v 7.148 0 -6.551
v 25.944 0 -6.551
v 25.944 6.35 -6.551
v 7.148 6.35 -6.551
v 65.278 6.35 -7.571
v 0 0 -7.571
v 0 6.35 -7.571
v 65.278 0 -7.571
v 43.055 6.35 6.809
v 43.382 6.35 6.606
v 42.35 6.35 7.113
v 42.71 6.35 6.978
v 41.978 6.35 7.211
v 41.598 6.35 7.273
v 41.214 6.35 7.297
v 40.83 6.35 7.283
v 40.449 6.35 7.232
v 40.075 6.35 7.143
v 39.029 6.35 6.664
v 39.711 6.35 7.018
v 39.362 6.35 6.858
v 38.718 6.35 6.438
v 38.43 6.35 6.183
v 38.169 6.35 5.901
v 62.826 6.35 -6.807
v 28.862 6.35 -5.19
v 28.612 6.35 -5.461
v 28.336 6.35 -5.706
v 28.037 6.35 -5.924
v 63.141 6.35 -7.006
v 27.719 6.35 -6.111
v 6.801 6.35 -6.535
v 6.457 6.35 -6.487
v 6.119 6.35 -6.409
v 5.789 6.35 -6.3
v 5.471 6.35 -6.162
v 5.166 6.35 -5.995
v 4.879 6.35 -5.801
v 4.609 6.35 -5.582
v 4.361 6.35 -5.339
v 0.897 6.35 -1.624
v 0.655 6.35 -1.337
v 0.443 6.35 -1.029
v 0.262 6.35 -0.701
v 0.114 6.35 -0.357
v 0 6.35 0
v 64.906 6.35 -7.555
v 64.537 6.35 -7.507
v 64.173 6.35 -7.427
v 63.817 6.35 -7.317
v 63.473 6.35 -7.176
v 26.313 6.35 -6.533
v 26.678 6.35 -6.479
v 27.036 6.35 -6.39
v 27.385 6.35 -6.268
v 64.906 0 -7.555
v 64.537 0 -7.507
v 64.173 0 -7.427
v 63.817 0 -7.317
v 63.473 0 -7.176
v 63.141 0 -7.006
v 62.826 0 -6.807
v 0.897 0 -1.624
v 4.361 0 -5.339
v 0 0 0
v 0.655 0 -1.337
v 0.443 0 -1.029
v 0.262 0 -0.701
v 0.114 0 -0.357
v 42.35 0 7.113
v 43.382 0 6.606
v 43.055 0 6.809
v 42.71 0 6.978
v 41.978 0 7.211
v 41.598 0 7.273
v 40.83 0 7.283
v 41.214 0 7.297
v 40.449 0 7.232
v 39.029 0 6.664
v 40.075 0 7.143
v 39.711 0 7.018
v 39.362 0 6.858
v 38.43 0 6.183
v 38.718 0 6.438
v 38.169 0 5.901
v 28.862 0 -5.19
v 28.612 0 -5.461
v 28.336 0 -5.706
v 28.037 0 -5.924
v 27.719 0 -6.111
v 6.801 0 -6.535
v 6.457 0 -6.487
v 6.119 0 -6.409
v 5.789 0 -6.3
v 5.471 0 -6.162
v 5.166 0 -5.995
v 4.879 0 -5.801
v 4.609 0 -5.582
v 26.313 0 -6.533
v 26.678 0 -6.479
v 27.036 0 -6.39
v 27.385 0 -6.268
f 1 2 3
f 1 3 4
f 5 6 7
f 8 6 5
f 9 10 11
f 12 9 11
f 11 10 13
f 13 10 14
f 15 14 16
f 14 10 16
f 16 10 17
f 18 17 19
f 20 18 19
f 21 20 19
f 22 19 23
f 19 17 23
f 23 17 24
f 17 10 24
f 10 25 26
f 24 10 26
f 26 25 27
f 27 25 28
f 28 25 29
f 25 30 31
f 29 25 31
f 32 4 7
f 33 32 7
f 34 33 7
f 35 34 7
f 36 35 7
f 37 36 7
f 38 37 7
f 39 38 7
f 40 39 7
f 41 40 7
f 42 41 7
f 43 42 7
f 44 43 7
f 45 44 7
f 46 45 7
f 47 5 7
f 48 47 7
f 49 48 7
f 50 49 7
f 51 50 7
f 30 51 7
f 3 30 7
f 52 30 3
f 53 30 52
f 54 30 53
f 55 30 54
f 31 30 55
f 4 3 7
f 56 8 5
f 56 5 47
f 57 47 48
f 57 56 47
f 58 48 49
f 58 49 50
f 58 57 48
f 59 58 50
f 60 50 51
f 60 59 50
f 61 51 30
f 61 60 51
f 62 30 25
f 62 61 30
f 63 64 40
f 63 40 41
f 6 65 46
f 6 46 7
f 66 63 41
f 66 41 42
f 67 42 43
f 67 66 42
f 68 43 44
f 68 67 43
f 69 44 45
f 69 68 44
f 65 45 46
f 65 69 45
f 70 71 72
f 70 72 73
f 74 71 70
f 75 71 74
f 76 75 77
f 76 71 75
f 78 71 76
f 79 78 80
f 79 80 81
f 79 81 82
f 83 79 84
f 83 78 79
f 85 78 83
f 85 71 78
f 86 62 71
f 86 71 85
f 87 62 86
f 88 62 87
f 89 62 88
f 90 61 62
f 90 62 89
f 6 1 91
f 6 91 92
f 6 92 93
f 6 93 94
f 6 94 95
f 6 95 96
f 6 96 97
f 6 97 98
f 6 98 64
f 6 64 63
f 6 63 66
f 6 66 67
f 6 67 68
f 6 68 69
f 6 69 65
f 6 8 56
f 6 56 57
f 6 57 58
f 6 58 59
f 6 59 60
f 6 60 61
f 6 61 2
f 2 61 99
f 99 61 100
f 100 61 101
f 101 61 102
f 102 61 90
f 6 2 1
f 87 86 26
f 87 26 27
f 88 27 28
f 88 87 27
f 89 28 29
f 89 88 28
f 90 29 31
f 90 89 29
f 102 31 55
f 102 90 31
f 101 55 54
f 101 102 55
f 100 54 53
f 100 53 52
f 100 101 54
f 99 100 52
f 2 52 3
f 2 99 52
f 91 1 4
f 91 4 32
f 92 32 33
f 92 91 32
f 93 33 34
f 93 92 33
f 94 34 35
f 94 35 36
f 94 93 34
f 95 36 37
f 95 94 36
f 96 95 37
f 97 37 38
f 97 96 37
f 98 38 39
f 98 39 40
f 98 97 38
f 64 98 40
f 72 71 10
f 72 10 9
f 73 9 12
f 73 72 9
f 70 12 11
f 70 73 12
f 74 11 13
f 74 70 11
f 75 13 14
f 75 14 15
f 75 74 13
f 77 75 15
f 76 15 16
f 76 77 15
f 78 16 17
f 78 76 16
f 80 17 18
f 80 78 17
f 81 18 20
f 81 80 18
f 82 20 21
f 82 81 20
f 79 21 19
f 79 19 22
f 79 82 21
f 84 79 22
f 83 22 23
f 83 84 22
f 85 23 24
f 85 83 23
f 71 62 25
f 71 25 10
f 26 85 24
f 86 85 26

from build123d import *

# Parameters (mm, degrees)
BOSS_EXTRUDE1_DEPTH = 6.35


with BuildPart() as part:
    # Sketch1 → Boss-Extrude1 (new body)
    with BuildSketch(Plane(origin=(0, 0, 0), x_dir=(1, 0, 0), z_dir=(0, 1, 0))):
        with BuildLine():
            Line((0, 0), (0, 7.57119509))
            Line((0, 7.57119509), (65.278, 7.57119509))
            ThreePointArc((65.278, 7.57119509), (63.993935294, 7.375852222), (62.826050709, 6.807497929))
            Line((62.826050709, 6.807497929), (43.381923411, -6.606107017))
            ThreePointArc((43.381923411, -6.606107017), (40.638946364, -7.262106405), (38.168659449, -5.901246074))
            Line((38.168659449, -5.901246074), (28.862380436, 5.189545373))
            ThreePointArc((28.862380436, 5.189545373), (27.553926685, 6.193557249), (25.943751107, 6.55052458))
            Line((25.943751107, 6.55052458), (7.147751107, 6.55052458))
            ThreePointArc((7.147751107, 6.55052458), (5.628517155, 6.234523464), (4.361293504, 5.338938332))
            Line((4.361293504, 5.338938332), (0.896741835, 1.623661528))
            ThreePointArc((0.896741835, 1.623661528), (0.348055551, 0.867234544), (0, 0))
        make_face()
    extrude(amount=BOSS_EXTRUDE1_DEPTH)


solid = part.part
